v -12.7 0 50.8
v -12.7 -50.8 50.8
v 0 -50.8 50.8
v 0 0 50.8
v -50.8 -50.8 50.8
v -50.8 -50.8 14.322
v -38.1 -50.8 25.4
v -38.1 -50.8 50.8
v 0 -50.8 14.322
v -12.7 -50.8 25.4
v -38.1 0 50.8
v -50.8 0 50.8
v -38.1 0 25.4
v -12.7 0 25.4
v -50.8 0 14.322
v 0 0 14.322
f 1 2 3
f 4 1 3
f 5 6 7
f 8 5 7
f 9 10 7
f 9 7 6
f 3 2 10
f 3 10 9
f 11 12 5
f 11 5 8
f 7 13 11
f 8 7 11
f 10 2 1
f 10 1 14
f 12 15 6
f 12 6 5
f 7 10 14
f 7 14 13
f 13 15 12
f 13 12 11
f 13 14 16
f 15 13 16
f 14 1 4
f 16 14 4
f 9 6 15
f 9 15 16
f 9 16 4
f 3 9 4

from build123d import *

# Parameters (mm, degrees)
F0_W     = 50.8
F0_H     = 50.8
F1_DEPTH = 50.8
F3_DEPTH = 50.8


with BuildPart() as f1:
    # F0 (on Front) → F1 (new body)
    with BuildSketch(Plane.XZ):
        with Locations((-25.4, 25.4)):
            Rectangle(F0_W, F0_H)
    extrude(amount=F1_DEPTH)

    # F2 (on face) → F3 (intersect)
    with BuildSketch(Plane.XZ.offset(50.8)):
        Polygon((-38.1, 50.8), (-50.8, 50.8), (-50.8, 14.321598), (0, 14.321598), (0, 50.8), (-12.7, 50.8), (-12.7, 25.4), (-38.1, 25.4), align=None)
    extrude(amount=-F3_DEPTH, mode=Mode.INTERSECT)


solid = f1.part
